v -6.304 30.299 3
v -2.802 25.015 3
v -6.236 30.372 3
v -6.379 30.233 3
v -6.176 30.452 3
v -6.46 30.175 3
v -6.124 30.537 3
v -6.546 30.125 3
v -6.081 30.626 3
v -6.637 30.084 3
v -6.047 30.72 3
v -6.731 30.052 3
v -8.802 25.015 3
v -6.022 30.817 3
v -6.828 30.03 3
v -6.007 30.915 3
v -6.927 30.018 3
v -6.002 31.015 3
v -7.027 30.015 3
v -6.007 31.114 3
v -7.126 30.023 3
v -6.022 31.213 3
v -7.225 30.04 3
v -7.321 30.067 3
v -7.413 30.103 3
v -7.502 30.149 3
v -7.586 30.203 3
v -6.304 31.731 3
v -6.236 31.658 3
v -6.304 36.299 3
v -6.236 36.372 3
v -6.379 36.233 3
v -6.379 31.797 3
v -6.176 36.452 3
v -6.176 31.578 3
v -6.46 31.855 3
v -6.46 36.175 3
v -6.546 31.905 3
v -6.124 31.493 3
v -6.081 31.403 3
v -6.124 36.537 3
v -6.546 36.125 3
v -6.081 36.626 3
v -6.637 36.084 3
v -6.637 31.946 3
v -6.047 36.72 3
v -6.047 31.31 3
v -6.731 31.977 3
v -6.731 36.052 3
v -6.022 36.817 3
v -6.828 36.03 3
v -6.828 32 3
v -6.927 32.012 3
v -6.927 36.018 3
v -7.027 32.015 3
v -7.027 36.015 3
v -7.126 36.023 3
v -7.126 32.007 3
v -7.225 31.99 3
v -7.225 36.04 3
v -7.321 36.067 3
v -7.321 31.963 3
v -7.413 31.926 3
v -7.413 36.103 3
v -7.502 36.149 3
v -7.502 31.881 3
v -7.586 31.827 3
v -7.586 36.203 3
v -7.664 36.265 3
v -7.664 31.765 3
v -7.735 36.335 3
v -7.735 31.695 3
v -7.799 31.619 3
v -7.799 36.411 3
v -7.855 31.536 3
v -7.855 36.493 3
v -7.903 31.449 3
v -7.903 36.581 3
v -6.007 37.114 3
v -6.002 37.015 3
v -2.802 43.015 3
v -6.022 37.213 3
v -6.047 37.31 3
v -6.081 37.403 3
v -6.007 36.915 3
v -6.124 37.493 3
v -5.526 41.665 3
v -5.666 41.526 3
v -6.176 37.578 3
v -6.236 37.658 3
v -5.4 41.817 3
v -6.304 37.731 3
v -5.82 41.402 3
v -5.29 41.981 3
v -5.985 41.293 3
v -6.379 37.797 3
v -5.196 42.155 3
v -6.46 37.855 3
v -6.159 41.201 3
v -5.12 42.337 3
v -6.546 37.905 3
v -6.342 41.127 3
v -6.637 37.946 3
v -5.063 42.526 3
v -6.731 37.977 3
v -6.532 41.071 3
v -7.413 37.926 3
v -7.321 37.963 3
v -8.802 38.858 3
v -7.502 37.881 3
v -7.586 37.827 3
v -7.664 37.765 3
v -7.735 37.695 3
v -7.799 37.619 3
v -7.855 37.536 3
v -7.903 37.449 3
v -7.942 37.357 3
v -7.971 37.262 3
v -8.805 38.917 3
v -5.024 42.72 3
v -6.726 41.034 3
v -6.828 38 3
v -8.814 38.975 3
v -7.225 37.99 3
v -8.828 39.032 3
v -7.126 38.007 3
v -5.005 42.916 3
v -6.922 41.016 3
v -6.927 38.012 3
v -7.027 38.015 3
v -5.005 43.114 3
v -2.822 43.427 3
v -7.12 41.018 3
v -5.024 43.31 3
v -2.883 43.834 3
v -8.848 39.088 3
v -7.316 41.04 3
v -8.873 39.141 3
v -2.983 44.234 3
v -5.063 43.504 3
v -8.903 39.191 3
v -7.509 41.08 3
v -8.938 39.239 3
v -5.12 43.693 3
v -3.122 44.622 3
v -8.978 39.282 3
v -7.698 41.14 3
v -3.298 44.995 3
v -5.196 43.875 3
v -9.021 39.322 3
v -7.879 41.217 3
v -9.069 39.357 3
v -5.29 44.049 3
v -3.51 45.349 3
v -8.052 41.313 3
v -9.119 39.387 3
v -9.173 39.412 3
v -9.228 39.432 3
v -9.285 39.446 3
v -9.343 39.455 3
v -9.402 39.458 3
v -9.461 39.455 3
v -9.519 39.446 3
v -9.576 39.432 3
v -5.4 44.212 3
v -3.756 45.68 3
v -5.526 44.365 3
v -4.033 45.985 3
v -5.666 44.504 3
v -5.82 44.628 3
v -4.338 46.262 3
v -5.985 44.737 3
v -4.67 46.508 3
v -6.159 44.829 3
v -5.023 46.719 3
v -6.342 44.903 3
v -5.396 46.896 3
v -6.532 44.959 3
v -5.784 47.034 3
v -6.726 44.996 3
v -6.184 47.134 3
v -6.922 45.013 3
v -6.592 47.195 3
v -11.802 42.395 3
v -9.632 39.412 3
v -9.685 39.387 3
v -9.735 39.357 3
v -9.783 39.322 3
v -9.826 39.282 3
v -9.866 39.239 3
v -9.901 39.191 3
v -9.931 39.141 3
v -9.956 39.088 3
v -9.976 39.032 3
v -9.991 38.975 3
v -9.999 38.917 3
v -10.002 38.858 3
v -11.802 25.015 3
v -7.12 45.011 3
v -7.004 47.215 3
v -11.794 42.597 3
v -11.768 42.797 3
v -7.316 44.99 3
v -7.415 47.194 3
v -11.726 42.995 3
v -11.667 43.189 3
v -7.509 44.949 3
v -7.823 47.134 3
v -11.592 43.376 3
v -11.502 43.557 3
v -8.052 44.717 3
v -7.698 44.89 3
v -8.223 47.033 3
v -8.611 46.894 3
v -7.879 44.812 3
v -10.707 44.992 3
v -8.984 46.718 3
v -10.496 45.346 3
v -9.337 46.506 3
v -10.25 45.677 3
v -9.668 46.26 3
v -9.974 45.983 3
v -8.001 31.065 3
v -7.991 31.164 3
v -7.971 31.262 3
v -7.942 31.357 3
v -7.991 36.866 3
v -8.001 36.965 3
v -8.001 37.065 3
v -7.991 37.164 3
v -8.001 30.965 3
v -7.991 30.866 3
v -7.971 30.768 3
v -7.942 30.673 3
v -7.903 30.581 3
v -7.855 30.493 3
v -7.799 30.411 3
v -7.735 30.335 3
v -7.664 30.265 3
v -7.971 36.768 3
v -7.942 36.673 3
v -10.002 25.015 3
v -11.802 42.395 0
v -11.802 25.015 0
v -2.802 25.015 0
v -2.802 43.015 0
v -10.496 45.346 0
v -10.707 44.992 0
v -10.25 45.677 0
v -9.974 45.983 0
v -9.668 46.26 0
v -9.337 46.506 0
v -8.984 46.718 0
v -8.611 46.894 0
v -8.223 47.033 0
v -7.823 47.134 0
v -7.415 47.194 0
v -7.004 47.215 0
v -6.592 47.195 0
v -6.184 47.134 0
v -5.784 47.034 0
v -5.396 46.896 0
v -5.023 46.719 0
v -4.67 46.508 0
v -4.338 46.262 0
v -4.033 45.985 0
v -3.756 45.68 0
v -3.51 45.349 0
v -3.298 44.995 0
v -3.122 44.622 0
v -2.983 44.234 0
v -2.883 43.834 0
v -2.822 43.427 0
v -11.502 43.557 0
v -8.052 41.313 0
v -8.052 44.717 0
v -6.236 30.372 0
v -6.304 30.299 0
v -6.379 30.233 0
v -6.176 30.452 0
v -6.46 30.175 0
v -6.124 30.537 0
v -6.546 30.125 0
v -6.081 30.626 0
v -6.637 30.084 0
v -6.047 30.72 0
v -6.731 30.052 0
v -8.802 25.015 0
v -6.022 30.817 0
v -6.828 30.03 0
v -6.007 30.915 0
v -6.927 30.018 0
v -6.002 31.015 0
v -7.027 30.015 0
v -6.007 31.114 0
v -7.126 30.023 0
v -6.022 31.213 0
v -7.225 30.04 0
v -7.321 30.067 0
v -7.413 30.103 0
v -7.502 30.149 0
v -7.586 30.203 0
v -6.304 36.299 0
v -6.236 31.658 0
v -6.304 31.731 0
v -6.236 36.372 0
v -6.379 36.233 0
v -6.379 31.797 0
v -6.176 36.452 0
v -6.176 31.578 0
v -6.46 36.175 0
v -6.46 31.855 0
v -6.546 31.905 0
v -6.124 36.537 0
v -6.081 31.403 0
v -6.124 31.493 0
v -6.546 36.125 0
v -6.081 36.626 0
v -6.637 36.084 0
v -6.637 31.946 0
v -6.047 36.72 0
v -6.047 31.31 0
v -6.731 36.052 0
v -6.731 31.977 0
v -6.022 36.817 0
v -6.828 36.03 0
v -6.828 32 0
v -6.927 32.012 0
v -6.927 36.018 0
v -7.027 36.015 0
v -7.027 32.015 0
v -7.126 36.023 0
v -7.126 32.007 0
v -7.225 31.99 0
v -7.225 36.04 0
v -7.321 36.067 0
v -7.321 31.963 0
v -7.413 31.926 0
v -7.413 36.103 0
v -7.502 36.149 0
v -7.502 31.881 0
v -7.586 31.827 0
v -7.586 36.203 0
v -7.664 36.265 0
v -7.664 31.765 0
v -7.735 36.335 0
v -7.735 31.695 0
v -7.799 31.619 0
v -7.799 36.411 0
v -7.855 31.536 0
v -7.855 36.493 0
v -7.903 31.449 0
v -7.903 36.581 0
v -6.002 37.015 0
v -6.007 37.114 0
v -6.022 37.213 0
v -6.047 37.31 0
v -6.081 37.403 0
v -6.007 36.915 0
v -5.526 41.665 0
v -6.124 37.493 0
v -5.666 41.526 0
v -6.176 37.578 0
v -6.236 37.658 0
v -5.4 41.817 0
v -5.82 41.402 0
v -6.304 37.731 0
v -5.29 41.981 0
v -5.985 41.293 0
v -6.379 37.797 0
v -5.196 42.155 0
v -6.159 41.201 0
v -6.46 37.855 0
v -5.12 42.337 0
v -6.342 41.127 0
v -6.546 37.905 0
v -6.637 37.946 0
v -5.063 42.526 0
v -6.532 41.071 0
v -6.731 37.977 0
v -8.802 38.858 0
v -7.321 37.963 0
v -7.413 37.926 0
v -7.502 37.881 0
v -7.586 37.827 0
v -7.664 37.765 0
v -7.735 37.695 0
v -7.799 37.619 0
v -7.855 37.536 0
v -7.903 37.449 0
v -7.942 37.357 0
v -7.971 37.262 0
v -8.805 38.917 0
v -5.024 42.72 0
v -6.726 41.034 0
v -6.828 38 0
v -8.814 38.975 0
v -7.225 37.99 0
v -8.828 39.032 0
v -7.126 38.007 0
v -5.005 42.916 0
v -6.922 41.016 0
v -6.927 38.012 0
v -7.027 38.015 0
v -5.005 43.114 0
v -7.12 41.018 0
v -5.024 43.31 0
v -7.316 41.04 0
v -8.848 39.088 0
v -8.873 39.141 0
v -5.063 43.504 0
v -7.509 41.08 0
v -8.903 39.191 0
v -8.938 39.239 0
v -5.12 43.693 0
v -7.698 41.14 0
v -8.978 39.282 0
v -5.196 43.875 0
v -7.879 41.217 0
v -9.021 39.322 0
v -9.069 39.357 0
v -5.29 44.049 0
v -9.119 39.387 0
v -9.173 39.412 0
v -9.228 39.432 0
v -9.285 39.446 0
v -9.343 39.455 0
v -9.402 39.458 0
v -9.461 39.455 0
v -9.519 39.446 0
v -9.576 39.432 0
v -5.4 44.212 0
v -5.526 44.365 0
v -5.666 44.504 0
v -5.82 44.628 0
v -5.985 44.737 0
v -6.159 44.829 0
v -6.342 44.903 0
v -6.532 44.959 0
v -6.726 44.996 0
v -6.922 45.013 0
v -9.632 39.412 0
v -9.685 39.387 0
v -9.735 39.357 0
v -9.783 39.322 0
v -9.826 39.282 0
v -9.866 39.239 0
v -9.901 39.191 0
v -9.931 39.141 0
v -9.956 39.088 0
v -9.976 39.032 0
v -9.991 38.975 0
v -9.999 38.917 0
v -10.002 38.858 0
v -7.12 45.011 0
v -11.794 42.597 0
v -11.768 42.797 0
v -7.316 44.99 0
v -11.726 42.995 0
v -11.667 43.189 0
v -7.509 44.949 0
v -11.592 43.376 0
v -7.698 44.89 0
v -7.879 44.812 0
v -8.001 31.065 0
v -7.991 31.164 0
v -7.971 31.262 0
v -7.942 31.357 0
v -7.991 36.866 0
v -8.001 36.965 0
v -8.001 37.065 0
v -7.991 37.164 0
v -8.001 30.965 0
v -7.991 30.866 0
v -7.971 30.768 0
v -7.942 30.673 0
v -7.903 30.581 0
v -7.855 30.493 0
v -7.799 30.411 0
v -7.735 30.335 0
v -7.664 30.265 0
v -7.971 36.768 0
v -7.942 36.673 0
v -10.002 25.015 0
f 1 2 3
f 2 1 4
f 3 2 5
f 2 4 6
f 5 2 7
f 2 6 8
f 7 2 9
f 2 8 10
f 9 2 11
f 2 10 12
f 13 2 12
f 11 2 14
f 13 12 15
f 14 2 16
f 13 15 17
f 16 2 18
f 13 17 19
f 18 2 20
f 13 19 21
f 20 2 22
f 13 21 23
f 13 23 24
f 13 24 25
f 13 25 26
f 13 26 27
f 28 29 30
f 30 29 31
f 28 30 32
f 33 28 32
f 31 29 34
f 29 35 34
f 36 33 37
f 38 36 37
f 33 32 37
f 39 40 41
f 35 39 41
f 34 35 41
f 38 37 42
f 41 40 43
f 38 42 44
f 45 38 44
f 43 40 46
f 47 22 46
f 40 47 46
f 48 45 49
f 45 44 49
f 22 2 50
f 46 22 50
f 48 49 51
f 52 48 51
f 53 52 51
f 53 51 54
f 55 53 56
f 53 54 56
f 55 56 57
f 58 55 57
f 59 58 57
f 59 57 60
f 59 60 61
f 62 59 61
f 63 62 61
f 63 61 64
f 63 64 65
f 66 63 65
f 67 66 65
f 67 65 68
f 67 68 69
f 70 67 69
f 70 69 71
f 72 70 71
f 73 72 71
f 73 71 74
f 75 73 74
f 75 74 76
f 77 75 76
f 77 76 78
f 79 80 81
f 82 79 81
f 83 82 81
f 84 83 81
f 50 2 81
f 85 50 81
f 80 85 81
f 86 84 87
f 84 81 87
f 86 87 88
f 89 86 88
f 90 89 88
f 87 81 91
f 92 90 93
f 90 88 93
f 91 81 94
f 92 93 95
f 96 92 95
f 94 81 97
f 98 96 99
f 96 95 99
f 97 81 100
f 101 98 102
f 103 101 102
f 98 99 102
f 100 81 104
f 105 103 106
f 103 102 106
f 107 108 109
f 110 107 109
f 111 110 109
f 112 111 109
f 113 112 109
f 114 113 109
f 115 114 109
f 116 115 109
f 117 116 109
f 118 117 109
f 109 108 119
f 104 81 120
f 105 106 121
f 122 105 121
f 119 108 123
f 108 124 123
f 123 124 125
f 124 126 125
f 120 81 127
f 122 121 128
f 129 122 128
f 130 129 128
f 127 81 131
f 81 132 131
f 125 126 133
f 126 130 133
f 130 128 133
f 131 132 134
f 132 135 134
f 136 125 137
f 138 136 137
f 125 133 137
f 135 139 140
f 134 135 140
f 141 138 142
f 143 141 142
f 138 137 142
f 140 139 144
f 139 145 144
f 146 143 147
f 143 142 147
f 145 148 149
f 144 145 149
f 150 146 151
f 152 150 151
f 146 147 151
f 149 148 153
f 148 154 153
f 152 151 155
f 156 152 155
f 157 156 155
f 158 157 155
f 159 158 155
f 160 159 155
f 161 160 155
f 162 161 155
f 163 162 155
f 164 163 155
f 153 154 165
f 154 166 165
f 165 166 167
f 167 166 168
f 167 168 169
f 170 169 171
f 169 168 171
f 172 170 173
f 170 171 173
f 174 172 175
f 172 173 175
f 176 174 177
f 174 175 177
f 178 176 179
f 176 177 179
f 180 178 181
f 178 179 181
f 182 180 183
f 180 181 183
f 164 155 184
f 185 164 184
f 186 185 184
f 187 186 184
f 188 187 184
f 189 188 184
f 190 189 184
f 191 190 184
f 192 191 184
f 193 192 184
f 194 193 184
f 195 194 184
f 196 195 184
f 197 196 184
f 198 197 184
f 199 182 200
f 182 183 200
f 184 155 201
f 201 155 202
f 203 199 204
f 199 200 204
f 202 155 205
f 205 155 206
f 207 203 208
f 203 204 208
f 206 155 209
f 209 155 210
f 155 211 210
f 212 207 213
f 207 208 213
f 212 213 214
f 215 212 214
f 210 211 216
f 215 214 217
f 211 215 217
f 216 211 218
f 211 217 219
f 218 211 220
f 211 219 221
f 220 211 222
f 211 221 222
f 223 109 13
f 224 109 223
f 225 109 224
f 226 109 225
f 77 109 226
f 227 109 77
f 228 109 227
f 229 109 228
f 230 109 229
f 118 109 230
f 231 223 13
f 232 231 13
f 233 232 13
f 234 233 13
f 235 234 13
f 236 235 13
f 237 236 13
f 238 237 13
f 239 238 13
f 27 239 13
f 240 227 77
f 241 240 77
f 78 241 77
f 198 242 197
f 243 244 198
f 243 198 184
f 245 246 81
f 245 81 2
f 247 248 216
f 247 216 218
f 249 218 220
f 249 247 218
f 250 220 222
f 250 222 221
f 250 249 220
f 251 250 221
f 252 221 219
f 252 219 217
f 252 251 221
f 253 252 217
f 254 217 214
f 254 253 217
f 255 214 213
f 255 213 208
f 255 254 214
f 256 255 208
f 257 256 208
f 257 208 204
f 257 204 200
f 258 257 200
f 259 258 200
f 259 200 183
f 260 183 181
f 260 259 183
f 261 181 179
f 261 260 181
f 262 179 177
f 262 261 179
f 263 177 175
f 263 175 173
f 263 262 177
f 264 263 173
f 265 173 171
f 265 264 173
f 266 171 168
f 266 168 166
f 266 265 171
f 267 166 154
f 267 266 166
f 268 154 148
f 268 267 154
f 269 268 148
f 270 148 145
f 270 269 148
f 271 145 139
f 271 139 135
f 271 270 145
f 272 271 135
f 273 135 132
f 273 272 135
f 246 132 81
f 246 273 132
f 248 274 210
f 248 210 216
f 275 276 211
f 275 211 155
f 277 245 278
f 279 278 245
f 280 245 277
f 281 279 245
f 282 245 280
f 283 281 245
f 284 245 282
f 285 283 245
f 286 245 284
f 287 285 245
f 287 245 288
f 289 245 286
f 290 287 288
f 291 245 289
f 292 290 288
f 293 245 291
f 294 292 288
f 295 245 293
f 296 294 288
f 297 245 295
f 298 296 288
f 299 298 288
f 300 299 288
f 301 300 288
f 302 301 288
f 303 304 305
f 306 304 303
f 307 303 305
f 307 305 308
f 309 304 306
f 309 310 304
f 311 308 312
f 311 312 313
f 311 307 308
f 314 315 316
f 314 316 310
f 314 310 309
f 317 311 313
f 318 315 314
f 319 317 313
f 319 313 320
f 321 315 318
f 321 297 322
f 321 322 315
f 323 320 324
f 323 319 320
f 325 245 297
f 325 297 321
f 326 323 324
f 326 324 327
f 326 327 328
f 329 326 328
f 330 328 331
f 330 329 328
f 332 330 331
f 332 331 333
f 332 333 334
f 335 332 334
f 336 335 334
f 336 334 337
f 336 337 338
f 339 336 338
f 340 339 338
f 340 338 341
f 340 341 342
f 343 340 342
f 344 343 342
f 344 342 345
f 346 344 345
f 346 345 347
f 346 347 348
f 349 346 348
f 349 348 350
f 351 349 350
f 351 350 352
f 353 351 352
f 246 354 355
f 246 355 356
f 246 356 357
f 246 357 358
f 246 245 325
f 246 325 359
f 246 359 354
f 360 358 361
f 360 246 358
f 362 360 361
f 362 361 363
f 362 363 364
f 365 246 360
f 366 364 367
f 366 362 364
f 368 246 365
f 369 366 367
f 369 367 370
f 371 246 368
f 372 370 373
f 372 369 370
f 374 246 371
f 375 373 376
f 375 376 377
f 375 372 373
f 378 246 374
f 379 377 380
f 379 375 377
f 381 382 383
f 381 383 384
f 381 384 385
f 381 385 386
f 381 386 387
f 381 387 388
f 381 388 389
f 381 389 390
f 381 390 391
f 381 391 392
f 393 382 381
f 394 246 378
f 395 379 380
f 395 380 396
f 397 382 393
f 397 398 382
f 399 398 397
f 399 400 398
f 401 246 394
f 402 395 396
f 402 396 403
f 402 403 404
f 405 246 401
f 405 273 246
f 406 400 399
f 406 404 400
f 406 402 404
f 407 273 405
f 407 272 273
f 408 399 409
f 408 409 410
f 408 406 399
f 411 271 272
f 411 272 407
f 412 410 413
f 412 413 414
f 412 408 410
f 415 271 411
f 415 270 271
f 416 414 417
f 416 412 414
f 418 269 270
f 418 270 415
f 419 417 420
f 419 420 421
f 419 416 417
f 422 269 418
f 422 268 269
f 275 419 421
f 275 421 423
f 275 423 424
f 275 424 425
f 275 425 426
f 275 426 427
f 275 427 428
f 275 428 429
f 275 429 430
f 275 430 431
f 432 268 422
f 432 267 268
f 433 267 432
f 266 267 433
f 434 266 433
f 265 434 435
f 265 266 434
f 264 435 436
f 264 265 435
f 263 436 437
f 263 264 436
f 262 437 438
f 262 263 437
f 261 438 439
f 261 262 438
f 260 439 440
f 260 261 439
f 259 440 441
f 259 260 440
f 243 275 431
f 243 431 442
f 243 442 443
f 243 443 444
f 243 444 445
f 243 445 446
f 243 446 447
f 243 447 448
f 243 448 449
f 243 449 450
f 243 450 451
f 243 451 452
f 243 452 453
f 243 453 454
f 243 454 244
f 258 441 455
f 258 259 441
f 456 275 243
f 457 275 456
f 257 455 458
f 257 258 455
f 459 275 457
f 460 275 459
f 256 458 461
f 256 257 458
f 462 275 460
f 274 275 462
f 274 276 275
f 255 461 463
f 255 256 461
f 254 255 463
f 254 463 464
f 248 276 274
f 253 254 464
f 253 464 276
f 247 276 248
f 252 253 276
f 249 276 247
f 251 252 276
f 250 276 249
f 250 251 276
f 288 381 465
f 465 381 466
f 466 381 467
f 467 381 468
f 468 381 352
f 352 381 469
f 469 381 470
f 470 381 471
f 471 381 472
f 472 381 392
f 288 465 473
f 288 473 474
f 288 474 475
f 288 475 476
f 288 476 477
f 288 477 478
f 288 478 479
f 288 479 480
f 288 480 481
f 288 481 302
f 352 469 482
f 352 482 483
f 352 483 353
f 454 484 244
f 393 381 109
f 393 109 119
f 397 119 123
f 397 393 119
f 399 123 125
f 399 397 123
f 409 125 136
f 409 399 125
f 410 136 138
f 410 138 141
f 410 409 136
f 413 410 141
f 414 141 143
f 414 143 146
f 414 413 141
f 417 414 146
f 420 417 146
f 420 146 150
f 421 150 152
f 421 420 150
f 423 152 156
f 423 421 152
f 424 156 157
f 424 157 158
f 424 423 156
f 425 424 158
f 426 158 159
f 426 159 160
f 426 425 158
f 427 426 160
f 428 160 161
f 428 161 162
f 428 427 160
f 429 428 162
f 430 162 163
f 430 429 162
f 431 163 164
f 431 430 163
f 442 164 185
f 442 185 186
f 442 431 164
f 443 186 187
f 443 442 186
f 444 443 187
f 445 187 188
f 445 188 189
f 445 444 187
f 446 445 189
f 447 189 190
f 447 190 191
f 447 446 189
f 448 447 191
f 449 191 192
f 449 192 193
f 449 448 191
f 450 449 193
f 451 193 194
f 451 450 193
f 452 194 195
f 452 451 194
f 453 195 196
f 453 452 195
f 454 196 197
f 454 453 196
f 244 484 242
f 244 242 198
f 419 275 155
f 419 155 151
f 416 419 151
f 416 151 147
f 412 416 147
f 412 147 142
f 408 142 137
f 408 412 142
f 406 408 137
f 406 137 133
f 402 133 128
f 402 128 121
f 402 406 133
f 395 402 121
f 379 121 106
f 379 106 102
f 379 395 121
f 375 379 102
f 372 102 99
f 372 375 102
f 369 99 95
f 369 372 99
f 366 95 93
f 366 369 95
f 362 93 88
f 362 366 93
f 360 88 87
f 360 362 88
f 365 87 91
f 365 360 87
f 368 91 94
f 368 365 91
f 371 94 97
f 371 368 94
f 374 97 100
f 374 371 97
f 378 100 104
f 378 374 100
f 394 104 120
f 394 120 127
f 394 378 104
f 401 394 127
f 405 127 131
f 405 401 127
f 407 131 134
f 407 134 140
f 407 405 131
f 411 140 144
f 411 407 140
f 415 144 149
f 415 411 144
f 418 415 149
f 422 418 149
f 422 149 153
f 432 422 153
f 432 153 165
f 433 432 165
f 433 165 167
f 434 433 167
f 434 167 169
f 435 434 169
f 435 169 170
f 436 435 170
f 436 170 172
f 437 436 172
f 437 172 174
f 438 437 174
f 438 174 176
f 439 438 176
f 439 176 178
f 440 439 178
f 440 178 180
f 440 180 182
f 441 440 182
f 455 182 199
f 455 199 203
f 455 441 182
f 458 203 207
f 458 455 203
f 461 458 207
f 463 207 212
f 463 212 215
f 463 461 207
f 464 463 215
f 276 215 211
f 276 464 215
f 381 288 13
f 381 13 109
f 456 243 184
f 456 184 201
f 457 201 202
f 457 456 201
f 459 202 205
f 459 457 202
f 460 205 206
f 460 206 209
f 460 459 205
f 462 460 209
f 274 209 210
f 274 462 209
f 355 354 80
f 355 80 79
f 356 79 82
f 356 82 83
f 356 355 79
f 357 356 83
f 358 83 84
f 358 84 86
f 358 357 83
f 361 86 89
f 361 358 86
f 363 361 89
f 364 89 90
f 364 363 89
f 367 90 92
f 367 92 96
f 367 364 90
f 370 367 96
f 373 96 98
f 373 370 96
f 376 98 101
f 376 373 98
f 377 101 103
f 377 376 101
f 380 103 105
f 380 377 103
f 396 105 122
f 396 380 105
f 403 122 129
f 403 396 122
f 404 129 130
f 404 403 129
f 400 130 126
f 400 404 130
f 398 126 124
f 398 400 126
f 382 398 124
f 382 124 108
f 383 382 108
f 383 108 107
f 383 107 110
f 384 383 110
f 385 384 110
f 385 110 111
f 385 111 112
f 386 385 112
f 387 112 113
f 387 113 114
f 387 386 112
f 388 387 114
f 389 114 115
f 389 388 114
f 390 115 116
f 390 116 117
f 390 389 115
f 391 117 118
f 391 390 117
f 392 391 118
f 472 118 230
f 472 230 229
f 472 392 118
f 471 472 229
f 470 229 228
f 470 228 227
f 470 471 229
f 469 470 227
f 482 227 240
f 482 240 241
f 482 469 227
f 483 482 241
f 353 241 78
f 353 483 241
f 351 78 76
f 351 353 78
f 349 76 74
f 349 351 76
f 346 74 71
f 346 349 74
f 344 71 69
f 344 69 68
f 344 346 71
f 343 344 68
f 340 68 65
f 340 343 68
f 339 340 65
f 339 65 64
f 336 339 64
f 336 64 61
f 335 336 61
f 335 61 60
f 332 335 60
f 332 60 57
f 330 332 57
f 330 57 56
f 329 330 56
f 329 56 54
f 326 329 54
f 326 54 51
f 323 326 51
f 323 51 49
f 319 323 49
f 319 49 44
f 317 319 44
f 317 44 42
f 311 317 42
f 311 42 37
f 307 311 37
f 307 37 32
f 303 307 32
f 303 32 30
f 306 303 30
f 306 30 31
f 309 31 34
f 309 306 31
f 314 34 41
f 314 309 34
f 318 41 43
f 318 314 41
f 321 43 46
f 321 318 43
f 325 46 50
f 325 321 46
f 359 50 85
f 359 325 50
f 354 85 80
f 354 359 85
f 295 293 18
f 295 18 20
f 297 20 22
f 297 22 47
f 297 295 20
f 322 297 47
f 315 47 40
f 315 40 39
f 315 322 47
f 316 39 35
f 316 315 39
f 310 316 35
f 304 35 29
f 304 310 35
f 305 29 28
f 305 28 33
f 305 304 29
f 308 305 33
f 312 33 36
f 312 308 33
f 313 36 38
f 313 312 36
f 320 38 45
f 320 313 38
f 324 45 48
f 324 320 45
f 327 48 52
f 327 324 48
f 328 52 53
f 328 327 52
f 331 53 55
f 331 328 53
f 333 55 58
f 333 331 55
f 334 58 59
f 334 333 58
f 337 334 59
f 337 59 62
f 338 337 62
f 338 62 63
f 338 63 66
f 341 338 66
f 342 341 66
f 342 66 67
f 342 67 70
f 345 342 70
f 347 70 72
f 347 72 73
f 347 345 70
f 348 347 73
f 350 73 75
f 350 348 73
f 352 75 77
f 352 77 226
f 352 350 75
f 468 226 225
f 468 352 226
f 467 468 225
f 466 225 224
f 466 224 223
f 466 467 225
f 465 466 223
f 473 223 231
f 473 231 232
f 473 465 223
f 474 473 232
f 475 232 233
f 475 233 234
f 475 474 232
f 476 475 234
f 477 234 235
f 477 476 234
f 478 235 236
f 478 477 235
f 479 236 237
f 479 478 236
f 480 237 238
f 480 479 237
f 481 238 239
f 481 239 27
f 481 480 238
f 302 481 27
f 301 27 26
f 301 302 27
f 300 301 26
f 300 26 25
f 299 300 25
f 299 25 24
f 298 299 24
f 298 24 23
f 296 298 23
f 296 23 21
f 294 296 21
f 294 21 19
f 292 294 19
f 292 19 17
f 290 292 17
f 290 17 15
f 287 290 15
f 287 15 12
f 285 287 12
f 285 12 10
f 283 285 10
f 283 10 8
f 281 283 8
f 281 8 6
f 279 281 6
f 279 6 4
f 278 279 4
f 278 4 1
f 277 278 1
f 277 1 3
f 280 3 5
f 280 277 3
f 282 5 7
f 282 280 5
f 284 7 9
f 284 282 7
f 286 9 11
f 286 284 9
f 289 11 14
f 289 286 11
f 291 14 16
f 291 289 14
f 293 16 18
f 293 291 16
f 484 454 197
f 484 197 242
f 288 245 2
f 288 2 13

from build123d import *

# Parameters (mm, degrees)
SKETCH_1_R      = 1
EXTRUDE_2_DEPTH = 3


with BuildPart() as part:
    # 草图1 → 凸台-拉伸2 (new body)
    with BuildSketch(Plane.XY):
        with BuildLine():
            Line((-8.802114216, 25.014860267), (-8.802114216, 38.857938329))
            ThreePointArc((-8.802114216, 38.857938329), (-9.402114216, 39.457938329), (-10.002114216, 38.857938329))
            Line((-10.002114216, 38.857938329), (-10.002114216, 25.014860267))
            Line((-10.002114216, 25.014860267), (-11.802114216, 25.014860267))
            Line((-11.802114216, 25.014860267), (-11.802114216, 42.39491112))
            ThreePointArc((-11.802114216, 42.39491112), (-11.725840507, 42.995157842), (-11.501867444, 43.557252027))
            Line((-11.501867444, 43.557252027), (-10.707433177, 44.992386854))
            ThreePointArc((-10.707433177, 44.992386854), (-5.982884025, 47.089313582), (-2.802114216, 43.014860267))
            Line((-2.802114216, 43.014860267), (-2.802114216, 25.014860267))
            Line((-2.802114216, 25.014860267), (-8.802114216, 25.014860267))
        make_face()
        with Locations((-7.002114216, 37.014860267)):
            Circle(SKETCH_1_R, mode=Mode.SUBTRACT)
        with Locations((-7.002114216, 31.014860267)):
            Circle(SKETCH_1_R, mode=Mode.SUBTRACT)
        with BuildLine():
            Line((-8.052114216, 43.014860267), (-8.052114216, 41.312655814))
            ThreePointArc((-8.052114216, 41.312655814), (-5.002114216, 43.014860267), (-8.052114216, 44.71706472))
            Line((-8.052114216, 44.71706472), (-8.052114216, 43.014860267))
        make_face(mode=Mode.SUBTRACT)
    extrude(amount=EXTRUDE_2_DEPTH)


solid = part.part
